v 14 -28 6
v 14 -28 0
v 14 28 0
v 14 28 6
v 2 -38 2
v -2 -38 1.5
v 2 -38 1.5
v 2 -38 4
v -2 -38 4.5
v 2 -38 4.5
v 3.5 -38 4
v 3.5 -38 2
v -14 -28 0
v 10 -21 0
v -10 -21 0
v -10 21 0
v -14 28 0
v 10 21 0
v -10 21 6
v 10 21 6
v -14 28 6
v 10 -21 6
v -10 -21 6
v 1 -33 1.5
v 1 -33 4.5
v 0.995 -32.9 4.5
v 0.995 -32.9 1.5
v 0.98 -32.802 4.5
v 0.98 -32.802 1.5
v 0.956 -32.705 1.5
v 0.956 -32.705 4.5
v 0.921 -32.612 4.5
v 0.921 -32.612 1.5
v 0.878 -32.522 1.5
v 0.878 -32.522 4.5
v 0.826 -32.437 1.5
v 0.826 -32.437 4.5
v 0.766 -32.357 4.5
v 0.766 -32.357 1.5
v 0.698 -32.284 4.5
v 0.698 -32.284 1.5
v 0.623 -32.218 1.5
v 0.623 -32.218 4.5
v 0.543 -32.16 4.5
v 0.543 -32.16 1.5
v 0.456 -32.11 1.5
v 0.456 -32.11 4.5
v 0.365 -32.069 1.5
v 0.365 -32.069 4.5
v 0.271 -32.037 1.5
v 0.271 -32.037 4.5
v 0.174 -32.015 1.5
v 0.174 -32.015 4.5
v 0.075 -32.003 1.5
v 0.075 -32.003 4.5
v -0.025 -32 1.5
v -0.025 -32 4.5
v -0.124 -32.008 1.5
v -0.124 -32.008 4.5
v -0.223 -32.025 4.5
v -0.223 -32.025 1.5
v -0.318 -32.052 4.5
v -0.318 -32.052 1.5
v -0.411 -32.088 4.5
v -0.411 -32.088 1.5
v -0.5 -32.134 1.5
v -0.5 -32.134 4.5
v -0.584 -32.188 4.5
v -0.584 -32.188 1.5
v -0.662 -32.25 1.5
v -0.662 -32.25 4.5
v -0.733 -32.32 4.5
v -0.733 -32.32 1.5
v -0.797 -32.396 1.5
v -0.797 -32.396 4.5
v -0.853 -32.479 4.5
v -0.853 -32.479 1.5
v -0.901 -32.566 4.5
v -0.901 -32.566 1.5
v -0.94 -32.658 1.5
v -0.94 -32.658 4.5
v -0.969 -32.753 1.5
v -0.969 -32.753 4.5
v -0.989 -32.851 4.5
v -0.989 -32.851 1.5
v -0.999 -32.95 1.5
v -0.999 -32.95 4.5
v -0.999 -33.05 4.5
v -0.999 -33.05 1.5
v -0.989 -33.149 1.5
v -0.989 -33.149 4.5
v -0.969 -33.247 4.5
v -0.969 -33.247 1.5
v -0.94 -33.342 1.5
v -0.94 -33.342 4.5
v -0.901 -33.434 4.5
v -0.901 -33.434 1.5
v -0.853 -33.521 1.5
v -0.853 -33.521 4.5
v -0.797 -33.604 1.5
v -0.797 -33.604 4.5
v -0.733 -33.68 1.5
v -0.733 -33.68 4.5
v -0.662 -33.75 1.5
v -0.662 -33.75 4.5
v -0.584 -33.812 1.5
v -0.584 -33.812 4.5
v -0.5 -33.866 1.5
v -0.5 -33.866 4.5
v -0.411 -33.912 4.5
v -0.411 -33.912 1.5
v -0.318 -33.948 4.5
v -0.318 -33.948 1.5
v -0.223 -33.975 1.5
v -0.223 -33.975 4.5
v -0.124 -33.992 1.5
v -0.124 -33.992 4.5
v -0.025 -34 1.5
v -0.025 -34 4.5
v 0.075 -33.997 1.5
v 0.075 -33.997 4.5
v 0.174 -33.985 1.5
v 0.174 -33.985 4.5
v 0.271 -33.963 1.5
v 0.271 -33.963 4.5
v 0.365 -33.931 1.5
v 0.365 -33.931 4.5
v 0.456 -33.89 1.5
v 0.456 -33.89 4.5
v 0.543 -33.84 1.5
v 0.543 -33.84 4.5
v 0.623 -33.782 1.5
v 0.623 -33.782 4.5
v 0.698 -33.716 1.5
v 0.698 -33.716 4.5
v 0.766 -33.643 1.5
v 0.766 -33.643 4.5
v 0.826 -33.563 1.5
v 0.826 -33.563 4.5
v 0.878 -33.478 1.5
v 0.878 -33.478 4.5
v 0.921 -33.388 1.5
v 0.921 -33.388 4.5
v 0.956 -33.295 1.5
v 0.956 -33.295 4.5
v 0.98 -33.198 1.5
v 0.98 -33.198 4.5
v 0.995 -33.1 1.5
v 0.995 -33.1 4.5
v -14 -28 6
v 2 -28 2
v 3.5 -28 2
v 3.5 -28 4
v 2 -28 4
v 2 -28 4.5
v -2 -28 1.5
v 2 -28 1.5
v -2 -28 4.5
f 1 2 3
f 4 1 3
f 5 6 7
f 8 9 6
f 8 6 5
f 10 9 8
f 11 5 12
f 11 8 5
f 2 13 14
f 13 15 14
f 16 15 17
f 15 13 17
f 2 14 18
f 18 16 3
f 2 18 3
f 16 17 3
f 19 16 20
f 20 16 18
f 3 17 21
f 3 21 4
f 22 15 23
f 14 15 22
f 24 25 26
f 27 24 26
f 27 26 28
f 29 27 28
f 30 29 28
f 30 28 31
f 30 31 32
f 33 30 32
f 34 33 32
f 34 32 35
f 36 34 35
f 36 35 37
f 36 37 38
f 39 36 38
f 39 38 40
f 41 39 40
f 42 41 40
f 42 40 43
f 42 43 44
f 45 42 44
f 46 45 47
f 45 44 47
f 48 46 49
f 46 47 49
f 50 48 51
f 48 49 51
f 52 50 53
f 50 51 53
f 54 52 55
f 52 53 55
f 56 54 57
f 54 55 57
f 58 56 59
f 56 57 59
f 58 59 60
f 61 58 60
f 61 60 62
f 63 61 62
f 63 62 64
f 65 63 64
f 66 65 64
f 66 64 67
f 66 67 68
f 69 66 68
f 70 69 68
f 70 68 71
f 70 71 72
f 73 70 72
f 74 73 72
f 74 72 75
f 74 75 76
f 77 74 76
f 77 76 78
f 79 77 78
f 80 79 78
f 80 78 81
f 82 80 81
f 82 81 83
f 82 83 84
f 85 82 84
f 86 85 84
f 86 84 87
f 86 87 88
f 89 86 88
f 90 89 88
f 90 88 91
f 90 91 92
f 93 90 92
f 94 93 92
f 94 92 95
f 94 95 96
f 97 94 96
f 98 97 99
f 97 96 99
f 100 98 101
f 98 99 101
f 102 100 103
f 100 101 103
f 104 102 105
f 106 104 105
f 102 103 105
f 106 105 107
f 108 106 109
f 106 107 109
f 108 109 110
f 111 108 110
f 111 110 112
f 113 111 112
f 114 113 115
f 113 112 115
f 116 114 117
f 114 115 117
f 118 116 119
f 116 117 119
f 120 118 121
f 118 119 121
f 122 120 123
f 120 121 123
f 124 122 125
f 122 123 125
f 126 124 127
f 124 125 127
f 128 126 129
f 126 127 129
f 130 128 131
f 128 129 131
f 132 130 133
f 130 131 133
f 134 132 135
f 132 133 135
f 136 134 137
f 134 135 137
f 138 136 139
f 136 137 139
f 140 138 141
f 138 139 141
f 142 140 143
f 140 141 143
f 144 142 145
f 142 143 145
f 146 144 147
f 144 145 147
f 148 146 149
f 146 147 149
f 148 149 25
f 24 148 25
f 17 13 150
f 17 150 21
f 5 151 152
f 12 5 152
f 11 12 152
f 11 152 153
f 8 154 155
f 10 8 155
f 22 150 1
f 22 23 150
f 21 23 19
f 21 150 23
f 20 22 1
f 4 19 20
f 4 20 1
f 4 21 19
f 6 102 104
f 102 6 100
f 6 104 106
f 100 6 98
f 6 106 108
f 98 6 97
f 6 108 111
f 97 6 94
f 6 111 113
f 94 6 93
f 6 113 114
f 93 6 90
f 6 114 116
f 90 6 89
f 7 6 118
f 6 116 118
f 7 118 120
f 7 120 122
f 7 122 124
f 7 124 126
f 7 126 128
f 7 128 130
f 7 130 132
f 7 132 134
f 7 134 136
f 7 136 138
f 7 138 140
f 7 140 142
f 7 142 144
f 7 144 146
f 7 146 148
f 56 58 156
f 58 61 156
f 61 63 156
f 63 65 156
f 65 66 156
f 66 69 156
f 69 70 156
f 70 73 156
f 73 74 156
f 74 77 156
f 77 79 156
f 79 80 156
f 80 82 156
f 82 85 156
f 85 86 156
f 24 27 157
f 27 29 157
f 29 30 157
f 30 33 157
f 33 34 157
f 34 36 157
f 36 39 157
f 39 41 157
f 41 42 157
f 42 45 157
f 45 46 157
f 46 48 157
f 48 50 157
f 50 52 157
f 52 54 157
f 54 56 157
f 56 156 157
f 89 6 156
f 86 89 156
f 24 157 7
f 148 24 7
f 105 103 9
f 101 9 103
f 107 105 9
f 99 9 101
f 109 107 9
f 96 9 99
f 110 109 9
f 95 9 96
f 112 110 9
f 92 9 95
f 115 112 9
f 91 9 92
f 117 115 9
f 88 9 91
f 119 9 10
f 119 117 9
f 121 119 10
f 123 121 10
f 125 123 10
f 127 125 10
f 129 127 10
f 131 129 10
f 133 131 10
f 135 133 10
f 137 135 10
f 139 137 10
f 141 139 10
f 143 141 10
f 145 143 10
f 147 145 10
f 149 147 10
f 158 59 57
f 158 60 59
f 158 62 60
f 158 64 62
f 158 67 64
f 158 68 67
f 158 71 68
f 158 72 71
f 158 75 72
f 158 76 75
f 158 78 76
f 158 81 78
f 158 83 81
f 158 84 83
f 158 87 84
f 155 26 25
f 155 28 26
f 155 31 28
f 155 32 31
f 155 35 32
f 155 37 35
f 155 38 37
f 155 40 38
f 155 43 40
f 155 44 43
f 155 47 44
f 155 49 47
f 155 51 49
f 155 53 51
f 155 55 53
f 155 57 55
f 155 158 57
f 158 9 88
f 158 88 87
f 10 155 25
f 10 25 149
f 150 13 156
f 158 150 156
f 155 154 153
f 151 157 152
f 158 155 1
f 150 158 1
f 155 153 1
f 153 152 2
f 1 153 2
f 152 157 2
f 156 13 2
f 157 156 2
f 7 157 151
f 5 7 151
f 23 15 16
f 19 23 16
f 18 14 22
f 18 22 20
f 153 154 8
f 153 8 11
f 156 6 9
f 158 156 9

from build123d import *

# Parameters (mm, degrees)
SKETCH1_W           = 28
SKETCH1_H           = 56
SKETCH1_W_2         = 20
SKETCH1_H_2         = 42
BOSS_EXTRUDE1_DEPTH = 6
SKETCH2_W           = 4
SKETCH2_H           = 3
SKETCH2_W_2         = 1.5
SKETCH2_H_2         = 2
BOSS_EXTRUDE2_DEPTH = 10
SKETCH3_R           = 1
CUT_EXTRUDE1_DEPTH  = 10


with BuildPart() as part:
    # Sketch1 → Boss-Extrude1 (new body)
    with BuildSketch(Plane.XY):
        Rectangle(SKETCH1_W, SKETCH1_H)
        Rectangle(SKETCH1_W_2, SKETCH1_H_2, mode=Mode.SUBTRACT)
    extrude(amount=BOSS_EXTRUDE1_DEPTH)

    # Sketch2 → Boss-Extrude2 (add)
    with BuildSketch(Plane.XZ.offset(28)):
        with Locations((0, 3)):
            Rectangle(SKETCH2_W, SKETCH2_H)
        with Locations((2.75, 3)):
            Rectangle(SKETCH2_W_2, SKETCH2_H_2)
    extrude(amount=BOSS_EXTRUDE2_DEPTH)

    # Sketch3 → Cut-Extrude1 (cut)
    with BuildSketch(Plane.XY.offset(4.5)):
        with Locations((0, -33)):
            Circle(SKETCH3_R)
    extrude(amount=-CUT_EXTRUDE1_DEPTH, mode=Mode.SUBTRACT)


solid = part.part
